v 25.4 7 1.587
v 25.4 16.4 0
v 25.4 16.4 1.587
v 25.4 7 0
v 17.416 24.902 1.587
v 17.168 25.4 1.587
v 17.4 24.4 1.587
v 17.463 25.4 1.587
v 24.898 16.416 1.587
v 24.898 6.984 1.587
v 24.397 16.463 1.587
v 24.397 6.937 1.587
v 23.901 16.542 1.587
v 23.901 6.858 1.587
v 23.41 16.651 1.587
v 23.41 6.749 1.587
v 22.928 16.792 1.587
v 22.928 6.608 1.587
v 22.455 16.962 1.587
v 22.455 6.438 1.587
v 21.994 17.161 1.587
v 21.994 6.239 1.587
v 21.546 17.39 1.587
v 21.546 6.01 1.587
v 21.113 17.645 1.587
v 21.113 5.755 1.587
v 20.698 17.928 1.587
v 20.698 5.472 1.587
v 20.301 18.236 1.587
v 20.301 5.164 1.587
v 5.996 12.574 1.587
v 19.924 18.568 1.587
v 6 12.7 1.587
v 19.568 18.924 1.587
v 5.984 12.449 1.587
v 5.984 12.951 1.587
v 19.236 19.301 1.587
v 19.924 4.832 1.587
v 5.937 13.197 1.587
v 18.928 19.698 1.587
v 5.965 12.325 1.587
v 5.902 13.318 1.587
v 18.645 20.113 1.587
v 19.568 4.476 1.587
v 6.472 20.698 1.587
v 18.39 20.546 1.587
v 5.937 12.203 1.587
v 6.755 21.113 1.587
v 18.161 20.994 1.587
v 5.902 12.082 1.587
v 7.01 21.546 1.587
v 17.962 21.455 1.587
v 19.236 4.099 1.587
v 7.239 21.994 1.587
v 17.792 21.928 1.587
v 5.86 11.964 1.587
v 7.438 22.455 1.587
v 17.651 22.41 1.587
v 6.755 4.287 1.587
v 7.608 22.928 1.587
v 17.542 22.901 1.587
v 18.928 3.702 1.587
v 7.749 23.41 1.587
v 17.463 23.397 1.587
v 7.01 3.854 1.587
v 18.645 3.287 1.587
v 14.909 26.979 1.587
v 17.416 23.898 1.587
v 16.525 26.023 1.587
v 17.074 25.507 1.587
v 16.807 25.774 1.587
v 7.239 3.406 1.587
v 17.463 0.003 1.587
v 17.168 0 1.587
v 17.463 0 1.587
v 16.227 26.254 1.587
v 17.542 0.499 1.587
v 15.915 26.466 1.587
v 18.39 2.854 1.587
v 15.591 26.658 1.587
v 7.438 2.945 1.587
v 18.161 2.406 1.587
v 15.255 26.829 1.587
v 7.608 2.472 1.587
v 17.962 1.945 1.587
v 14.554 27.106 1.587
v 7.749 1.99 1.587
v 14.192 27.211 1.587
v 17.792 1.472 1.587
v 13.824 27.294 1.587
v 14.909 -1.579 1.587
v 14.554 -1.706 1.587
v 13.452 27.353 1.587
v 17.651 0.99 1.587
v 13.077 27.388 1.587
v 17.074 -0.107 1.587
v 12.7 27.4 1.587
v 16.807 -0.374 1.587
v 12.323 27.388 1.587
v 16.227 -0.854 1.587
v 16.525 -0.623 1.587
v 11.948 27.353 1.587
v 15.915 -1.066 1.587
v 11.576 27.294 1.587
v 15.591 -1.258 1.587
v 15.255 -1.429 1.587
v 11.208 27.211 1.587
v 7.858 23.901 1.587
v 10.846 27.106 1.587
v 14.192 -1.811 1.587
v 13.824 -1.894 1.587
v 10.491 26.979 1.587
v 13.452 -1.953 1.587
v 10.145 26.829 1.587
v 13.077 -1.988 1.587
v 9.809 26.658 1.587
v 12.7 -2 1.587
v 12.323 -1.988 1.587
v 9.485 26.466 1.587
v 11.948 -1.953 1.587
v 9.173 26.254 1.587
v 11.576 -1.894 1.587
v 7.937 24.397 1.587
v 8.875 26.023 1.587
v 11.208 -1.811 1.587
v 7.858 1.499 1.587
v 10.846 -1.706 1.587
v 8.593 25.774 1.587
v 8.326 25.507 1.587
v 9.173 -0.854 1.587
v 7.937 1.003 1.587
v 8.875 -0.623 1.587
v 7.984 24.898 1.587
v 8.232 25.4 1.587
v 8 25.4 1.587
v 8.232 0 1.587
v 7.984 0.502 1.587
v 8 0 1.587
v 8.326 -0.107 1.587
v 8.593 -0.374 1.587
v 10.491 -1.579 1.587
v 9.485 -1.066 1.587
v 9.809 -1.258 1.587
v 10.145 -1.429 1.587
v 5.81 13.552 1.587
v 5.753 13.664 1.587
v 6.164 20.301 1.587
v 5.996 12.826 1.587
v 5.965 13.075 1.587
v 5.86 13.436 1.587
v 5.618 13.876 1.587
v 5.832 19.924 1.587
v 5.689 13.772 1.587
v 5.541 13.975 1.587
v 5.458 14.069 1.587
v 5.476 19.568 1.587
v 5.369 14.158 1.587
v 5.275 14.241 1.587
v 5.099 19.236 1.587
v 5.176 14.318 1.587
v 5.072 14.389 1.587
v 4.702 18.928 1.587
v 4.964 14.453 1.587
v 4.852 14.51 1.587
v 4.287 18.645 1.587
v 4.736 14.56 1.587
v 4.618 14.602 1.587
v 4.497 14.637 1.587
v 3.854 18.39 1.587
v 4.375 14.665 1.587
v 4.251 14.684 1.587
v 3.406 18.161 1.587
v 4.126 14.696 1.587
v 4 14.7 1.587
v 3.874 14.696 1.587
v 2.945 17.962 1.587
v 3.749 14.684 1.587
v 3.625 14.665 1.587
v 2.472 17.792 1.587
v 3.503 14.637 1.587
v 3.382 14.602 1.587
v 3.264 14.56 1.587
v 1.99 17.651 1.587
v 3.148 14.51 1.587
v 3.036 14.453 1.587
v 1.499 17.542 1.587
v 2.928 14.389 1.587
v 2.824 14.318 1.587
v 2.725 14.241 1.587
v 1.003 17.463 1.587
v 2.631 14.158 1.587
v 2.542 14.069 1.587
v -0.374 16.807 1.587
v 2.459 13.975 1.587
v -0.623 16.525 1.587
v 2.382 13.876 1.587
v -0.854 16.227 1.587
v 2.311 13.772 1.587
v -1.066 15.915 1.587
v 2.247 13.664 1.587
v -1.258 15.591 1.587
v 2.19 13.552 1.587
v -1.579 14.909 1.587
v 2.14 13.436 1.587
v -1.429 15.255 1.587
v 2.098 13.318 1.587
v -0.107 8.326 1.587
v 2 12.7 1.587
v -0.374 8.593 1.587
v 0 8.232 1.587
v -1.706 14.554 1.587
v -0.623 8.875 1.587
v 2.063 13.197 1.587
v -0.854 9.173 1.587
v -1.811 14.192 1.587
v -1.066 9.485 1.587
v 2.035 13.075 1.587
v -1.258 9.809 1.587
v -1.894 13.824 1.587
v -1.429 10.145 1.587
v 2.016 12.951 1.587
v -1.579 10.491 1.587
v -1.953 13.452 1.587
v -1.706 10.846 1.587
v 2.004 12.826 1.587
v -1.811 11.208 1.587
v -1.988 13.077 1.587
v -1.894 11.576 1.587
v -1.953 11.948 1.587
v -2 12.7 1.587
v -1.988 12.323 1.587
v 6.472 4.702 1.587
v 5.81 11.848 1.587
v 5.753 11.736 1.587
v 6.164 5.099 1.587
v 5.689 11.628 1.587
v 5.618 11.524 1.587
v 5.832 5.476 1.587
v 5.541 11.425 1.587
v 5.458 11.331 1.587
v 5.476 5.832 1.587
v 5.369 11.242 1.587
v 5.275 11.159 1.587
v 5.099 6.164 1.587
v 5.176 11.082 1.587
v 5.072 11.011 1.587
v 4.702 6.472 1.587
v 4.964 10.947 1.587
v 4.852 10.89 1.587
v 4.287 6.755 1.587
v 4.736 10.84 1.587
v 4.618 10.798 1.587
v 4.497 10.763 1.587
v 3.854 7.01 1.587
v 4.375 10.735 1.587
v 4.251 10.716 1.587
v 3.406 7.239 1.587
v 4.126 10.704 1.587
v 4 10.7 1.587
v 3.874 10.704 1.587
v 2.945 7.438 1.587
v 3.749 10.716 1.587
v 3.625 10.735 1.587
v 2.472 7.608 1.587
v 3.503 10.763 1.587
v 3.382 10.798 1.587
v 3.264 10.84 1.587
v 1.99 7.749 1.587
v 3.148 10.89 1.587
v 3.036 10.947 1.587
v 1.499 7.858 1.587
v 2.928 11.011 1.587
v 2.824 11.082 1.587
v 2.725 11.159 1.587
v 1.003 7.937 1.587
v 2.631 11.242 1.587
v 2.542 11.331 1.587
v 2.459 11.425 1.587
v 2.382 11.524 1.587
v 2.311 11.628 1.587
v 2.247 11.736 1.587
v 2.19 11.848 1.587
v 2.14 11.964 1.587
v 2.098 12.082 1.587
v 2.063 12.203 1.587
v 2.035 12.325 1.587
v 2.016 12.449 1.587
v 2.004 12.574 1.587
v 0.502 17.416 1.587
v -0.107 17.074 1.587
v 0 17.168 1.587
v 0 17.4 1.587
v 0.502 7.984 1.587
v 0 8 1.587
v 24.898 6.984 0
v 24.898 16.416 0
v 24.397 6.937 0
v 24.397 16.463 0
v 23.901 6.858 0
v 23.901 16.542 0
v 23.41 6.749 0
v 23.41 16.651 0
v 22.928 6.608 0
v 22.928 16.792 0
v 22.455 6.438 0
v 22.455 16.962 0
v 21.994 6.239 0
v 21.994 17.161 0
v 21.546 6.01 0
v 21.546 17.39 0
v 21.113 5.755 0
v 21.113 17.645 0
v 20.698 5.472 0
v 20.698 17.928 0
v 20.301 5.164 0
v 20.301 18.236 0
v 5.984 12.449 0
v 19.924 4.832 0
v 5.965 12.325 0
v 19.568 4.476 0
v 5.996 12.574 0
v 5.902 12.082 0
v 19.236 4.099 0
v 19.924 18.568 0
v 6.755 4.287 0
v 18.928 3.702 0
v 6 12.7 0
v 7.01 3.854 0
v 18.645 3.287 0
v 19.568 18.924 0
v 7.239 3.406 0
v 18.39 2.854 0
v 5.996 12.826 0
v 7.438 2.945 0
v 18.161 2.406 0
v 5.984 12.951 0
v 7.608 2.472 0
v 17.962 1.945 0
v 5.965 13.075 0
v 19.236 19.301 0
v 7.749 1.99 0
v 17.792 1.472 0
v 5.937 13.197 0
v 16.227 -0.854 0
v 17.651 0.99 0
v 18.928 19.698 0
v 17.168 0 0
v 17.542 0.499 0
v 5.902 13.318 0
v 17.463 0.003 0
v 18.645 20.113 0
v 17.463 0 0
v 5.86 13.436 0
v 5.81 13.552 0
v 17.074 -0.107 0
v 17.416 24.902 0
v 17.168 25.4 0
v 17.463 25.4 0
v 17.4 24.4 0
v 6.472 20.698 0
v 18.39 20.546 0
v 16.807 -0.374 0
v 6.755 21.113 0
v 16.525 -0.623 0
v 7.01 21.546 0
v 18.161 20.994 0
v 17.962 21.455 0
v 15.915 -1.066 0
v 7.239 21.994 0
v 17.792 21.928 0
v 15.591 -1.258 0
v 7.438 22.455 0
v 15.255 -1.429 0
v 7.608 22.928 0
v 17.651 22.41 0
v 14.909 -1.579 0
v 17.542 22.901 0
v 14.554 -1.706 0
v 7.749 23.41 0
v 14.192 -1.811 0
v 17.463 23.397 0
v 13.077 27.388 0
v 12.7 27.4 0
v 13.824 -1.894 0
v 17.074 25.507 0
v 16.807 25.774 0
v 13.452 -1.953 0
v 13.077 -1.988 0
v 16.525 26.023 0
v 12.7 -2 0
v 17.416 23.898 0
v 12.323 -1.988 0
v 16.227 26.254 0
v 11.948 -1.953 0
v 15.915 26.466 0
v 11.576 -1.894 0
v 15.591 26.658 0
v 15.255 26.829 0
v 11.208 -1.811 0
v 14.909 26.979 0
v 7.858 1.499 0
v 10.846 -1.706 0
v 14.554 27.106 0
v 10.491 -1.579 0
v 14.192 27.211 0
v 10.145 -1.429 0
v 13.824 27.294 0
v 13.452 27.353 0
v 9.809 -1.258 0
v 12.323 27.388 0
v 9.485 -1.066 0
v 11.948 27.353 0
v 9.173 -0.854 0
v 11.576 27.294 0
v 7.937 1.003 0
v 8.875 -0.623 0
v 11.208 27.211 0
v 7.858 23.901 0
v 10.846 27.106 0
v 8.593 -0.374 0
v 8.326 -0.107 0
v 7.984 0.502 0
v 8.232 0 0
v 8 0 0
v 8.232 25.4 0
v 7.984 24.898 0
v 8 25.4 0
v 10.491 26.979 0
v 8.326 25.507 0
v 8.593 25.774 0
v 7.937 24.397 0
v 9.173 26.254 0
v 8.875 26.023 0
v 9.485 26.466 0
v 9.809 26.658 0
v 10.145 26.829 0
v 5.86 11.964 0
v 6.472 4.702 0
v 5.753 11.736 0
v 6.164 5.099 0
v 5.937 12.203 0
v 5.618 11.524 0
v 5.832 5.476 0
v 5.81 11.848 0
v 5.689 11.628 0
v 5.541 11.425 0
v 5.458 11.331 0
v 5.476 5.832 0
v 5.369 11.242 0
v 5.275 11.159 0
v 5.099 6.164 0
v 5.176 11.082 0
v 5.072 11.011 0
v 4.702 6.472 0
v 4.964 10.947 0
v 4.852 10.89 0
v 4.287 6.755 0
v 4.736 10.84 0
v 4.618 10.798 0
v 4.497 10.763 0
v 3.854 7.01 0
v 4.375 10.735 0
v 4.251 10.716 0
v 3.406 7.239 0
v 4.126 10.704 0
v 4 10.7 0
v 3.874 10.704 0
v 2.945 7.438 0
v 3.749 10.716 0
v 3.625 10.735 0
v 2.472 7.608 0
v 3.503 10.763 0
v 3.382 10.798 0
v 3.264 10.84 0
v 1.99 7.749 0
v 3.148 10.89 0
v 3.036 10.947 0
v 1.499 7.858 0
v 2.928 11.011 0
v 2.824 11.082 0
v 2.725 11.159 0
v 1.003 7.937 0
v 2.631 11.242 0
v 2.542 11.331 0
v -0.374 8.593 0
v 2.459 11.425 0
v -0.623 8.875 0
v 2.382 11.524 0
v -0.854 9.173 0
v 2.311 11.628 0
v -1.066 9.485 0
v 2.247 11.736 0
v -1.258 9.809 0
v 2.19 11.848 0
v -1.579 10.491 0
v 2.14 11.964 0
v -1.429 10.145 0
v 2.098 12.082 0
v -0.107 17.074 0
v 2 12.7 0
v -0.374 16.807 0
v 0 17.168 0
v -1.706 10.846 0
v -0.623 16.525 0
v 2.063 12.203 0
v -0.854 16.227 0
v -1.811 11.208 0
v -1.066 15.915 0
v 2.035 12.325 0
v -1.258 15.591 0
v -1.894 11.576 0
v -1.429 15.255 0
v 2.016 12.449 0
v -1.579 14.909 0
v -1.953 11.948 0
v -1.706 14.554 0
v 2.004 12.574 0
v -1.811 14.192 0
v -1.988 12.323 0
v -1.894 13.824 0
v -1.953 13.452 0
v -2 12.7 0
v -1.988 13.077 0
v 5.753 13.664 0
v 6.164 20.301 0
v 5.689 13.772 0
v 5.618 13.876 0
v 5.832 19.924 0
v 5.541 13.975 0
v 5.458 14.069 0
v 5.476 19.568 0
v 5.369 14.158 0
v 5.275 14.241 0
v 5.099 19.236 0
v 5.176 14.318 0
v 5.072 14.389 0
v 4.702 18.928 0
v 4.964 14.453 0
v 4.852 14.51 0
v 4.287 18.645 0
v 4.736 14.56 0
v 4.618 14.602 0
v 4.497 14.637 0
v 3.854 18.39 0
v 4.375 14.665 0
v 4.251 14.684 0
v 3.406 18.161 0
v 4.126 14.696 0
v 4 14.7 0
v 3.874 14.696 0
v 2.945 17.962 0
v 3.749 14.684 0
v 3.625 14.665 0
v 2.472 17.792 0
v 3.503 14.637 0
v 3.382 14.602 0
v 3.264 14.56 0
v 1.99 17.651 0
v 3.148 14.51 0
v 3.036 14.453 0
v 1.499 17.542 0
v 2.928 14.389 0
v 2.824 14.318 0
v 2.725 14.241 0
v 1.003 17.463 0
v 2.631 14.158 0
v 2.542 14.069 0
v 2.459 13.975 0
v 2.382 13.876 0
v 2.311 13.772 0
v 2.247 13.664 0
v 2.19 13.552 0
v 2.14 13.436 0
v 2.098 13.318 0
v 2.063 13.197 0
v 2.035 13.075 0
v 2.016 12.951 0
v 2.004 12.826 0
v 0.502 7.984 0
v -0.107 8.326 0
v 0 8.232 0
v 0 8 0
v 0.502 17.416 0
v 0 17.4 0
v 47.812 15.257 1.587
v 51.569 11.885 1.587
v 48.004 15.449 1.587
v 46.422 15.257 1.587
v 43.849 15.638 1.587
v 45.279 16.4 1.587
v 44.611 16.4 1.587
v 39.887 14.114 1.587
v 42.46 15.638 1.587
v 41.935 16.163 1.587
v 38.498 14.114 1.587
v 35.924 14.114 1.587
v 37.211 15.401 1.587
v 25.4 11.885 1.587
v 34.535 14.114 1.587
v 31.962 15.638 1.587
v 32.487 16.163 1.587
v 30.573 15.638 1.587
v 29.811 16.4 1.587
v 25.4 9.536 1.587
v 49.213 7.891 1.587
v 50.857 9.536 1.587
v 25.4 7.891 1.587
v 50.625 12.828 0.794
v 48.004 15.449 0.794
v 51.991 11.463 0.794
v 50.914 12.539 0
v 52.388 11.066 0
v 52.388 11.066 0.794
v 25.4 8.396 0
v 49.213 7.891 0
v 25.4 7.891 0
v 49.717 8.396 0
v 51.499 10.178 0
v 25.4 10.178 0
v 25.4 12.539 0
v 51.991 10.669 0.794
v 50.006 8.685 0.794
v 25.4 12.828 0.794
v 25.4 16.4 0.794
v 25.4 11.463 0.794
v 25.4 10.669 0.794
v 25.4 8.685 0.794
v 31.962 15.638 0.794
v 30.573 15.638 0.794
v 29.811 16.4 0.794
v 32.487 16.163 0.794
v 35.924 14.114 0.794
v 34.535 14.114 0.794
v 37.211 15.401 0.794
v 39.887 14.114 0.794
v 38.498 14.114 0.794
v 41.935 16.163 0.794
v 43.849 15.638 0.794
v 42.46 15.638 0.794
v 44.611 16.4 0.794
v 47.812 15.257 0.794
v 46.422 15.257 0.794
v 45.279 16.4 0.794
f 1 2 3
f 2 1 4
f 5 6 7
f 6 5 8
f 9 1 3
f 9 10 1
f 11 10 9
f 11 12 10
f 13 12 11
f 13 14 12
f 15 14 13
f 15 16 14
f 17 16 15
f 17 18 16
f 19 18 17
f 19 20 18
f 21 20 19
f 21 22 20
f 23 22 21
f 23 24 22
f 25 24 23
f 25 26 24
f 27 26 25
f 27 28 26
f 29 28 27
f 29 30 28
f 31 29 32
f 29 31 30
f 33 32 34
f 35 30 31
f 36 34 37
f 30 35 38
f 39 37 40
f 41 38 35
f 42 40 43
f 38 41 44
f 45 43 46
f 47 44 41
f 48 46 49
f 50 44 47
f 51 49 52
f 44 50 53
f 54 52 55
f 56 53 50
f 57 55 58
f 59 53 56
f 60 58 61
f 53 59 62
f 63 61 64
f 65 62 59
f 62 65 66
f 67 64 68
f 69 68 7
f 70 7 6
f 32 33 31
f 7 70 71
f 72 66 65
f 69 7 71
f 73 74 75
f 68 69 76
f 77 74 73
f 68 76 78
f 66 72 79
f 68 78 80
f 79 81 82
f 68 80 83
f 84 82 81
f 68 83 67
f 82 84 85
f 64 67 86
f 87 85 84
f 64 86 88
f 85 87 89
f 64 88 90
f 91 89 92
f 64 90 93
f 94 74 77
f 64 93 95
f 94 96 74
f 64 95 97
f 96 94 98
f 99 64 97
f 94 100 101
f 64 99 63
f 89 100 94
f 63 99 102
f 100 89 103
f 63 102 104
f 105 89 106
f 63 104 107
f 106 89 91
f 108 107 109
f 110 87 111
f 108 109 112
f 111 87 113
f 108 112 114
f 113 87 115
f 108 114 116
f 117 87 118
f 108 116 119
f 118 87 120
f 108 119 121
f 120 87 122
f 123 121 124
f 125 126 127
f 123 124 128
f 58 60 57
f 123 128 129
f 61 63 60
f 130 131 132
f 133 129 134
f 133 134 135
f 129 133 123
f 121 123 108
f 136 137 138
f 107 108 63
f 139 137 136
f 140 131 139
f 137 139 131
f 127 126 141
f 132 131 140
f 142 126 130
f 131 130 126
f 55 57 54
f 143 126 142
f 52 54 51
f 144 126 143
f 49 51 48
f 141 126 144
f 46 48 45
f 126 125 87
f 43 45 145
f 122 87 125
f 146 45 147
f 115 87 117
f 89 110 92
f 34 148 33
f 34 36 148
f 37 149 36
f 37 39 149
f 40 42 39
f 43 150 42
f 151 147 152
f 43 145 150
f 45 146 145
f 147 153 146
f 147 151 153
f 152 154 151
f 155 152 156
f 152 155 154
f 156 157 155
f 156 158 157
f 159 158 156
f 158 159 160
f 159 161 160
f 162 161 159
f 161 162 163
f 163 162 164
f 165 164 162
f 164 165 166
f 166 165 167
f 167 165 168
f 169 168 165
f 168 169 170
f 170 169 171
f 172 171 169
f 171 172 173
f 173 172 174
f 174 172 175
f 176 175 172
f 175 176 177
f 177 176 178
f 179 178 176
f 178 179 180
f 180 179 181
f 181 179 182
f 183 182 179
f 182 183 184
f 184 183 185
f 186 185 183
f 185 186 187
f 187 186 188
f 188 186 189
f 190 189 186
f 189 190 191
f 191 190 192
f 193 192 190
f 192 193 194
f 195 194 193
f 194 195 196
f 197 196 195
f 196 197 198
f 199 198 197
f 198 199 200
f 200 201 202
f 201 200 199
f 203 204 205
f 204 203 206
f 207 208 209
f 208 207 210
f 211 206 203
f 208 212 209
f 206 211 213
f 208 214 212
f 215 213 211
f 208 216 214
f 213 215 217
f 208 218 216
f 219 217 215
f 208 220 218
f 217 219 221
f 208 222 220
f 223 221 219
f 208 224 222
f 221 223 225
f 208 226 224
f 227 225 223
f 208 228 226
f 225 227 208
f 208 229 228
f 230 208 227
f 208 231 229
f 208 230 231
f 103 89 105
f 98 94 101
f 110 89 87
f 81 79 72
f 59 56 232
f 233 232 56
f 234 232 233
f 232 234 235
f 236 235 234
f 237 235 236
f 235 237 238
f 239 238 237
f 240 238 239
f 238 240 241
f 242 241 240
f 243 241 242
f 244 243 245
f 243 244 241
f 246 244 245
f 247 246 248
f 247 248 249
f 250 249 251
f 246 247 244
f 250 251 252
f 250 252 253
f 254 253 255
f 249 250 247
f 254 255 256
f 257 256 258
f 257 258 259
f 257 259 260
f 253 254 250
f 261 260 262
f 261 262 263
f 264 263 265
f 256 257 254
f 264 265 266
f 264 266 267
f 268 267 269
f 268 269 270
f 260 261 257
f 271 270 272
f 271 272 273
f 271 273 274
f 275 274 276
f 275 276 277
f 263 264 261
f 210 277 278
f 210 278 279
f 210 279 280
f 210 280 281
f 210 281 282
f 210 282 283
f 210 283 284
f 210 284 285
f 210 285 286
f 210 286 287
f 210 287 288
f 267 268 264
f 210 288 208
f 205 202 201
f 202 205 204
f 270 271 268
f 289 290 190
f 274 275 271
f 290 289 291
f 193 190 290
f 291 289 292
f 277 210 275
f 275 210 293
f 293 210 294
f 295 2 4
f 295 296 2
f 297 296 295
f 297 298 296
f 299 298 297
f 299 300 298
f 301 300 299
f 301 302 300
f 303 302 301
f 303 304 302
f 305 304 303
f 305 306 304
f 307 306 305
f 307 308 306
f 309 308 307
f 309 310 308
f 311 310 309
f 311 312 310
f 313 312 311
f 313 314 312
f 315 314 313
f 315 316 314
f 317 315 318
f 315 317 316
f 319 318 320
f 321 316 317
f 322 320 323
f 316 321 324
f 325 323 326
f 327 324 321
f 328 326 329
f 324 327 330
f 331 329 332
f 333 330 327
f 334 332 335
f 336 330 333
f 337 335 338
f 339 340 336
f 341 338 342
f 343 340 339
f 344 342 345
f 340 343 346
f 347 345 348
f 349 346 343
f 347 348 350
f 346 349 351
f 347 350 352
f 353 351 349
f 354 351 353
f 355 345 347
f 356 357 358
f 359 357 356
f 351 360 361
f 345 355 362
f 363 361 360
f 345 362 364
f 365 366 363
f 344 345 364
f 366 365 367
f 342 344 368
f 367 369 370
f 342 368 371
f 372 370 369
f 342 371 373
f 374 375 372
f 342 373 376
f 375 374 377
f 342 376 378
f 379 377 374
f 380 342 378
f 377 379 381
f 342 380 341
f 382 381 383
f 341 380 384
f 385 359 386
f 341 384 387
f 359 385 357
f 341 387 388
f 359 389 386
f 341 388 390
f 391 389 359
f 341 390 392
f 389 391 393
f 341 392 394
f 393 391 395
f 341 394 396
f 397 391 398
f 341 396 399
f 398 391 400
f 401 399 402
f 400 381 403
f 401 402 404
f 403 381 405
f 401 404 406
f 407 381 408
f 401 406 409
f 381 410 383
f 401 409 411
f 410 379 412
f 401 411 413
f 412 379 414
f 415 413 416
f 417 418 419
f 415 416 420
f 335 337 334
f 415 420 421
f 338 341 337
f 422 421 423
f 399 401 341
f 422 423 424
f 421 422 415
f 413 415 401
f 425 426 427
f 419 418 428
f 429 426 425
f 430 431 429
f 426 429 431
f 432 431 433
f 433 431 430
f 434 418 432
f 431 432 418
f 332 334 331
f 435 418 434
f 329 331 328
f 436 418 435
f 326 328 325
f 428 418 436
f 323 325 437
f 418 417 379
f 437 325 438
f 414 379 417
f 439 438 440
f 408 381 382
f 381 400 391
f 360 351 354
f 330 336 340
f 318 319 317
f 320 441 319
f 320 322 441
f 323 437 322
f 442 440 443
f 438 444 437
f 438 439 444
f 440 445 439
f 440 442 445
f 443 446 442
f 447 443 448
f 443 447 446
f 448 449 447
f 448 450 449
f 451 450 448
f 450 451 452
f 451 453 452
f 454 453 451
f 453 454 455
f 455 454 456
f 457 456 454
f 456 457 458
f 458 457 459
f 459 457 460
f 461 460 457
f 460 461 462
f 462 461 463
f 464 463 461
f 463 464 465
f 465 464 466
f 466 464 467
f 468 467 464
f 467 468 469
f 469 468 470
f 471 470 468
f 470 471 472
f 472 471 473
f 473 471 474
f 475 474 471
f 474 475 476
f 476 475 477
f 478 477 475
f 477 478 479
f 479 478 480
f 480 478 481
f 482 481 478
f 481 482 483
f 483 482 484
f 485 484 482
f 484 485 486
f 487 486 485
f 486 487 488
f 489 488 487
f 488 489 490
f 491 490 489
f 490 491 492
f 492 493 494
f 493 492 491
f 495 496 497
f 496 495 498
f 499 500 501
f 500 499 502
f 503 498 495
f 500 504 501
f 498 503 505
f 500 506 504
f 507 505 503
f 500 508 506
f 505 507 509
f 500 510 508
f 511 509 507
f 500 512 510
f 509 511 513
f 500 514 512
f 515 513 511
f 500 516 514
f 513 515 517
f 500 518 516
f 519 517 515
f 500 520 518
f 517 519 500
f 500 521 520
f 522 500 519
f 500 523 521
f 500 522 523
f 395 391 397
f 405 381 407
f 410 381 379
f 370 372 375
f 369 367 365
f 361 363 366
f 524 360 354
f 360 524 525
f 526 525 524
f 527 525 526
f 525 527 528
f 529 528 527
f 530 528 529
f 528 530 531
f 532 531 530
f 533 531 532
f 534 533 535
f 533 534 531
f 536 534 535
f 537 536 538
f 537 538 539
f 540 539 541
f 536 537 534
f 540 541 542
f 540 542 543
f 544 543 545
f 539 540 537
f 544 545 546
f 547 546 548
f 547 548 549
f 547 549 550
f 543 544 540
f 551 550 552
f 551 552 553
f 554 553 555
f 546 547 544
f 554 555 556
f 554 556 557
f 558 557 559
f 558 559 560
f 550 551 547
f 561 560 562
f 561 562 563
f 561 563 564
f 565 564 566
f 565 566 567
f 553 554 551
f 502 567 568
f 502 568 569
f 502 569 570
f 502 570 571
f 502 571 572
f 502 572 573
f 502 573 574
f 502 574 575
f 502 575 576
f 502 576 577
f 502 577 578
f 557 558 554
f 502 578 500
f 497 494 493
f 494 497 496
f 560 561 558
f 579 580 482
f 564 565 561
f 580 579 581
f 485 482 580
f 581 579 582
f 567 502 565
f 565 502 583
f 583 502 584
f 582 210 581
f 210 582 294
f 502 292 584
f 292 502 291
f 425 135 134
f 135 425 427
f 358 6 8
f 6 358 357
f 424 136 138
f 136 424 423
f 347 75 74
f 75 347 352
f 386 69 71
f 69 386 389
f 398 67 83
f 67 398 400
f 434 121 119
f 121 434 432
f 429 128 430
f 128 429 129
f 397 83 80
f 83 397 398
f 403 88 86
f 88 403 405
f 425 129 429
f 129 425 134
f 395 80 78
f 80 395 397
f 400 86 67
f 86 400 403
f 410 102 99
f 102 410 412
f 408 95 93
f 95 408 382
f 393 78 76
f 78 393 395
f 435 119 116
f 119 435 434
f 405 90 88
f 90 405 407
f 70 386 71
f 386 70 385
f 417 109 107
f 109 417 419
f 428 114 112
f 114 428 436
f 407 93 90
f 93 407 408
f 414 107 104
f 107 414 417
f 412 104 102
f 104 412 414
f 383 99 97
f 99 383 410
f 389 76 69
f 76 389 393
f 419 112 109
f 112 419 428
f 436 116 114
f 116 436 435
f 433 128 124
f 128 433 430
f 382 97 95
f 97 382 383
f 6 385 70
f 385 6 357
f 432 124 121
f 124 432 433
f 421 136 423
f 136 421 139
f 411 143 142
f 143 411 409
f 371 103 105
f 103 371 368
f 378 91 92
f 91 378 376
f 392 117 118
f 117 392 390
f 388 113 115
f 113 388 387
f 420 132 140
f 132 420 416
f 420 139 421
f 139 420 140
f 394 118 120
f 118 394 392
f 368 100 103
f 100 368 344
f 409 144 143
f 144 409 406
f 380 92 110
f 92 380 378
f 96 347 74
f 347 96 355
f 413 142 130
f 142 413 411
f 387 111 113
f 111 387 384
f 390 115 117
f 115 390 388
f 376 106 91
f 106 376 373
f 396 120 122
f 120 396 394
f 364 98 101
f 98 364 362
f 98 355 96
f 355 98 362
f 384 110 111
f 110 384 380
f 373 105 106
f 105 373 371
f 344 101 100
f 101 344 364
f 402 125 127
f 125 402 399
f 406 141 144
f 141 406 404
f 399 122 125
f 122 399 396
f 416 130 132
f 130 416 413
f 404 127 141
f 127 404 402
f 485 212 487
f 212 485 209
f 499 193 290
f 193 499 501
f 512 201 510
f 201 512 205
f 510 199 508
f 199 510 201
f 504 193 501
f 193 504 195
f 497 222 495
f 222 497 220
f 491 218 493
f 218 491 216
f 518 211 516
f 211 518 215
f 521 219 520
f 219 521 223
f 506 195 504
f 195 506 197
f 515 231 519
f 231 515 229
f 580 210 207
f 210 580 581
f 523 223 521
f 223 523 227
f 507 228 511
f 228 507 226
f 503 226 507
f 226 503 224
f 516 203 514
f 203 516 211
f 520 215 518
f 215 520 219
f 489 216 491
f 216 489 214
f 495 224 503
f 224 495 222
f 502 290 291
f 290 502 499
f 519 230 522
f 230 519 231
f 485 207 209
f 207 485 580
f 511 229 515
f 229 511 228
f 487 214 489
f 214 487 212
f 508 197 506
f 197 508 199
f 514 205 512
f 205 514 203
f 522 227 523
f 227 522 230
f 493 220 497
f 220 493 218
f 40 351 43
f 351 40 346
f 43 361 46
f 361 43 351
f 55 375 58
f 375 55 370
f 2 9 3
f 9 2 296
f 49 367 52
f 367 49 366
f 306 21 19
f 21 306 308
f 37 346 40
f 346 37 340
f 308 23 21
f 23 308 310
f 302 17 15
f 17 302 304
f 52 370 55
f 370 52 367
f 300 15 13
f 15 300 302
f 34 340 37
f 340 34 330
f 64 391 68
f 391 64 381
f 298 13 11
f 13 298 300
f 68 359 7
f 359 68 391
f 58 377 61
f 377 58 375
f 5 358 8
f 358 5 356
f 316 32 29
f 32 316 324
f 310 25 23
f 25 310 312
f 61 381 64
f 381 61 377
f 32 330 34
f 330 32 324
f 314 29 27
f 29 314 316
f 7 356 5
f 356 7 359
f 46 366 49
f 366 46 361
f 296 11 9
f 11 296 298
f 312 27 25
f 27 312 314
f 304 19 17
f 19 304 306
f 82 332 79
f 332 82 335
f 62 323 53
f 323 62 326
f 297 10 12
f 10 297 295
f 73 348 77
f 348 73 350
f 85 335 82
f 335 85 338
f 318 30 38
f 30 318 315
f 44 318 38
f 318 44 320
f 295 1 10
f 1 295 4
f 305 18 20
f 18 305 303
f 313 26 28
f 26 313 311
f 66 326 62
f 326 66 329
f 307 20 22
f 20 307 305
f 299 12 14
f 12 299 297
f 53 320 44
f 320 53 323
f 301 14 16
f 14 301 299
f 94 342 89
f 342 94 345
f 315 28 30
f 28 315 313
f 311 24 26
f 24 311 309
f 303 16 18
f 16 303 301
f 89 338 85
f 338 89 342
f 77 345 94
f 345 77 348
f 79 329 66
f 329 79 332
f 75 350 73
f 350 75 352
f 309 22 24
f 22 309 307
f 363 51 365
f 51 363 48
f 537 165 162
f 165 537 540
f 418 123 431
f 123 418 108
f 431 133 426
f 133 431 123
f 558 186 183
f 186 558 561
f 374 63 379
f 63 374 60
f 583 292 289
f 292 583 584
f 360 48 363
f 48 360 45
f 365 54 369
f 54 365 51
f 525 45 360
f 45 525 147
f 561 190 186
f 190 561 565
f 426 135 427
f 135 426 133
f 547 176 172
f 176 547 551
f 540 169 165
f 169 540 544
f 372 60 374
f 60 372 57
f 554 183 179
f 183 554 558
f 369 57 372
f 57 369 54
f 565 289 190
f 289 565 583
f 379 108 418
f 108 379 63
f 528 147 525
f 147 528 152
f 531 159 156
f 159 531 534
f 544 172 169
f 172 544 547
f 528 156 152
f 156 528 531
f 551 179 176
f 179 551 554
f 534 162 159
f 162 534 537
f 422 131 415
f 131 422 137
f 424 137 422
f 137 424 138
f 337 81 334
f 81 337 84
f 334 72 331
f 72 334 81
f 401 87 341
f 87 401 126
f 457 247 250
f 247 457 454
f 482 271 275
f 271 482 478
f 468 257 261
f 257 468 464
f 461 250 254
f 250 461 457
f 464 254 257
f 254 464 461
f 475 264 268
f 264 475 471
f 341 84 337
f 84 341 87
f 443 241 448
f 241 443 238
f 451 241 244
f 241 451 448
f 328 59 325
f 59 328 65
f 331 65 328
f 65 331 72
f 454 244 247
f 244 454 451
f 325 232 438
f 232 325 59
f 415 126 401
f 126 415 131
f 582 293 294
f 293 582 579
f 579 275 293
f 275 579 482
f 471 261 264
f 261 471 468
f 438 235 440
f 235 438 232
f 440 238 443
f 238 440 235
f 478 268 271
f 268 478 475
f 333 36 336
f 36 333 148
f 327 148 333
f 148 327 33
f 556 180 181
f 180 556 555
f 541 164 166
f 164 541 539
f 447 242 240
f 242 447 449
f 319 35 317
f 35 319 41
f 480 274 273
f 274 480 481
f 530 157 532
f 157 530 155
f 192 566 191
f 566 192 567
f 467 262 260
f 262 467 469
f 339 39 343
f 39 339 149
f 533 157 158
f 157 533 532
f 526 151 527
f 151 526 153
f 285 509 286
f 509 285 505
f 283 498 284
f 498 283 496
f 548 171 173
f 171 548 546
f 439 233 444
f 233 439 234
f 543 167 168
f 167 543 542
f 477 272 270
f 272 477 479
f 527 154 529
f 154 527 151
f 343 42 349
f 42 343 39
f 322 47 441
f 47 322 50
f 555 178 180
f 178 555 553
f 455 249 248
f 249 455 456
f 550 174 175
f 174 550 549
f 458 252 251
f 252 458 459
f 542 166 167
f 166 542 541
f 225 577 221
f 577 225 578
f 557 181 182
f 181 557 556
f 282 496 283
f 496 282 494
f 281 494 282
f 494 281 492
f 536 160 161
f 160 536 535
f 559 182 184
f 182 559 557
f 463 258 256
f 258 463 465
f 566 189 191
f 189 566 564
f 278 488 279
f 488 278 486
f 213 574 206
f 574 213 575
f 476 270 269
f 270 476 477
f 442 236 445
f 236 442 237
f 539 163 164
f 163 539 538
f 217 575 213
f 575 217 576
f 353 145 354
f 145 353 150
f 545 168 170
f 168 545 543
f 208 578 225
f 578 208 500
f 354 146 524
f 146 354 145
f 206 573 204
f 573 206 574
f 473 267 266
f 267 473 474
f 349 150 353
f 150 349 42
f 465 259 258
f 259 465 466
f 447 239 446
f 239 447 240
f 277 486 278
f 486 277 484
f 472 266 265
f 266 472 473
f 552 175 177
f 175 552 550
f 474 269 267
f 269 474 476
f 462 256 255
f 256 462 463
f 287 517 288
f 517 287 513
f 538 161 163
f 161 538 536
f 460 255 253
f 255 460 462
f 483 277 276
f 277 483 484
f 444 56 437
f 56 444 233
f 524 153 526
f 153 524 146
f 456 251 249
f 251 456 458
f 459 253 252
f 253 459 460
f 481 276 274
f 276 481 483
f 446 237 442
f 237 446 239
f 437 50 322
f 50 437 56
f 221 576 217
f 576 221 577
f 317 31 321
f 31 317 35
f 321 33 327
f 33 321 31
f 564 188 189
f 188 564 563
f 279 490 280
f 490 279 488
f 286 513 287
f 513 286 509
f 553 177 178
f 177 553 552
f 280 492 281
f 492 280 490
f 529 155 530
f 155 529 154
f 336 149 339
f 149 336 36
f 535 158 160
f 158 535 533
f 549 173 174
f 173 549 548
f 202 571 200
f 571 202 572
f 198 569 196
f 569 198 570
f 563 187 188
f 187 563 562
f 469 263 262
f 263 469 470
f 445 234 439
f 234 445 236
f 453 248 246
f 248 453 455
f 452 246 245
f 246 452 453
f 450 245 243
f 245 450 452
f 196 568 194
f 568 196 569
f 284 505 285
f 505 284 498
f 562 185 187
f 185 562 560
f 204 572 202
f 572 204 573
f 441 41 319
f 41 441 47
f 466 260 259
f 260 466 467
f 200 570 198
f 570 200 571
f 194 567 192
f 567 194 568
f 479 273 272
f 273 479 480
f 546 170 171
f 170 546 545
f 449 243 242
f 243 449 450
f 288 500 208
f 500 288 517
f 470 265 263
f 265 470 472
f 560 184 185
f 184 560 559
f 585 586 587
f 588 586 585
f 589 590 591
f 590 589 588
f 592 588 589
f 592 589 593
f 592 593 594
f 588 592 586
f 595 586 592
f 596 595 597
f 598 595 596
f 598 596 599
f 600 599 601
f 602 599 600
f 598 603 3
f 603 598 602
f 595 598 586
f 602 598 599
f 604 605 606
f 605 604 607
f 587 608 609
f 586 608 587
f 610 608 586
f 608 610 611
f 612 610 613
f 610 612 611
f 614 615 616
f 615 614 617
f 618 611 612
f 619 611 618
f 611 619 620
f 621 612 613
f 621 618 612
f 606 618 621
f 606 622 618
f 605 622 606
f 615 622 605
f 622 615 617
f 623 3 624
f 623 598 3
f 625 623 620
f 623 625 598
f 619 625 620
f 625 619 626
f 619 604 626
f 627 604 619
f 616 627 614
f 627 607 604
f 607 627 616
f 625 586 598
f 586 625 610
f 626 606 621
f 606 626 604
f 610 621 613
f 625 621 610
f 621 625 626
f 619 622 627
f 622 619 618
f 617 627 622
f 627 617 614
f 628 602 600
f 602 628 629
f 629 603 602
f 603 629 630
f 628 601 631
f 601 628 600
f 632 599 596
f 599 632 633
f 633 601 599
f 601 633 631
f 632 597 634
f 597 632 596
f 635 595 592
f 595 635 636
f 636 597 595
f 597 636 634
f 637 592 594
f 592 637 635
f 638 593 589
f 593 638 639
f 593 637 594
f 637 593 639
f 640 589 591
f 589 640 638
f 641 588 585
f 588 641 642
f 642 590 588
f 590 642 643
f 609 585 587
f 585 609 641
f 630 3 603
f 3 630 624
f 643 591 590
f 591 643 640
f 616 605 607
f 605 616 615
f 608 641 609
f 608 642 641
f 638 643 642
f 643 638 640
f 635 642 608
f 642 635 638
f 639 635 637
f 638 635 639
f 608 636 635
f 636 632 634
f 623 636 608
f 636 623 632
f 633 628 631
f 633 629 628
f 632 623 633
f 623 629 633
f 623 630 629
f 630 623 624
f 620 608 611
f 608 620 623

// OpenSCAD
//BEST G - Model

$fn=100;

function mm(i) = i*25.4;

module bow(bow_length, bow_width, bow_thickness)
{
	difference()
	{
		union()
		{
			cube([bow_length, bow_width, bow_thickness]);

			//Place cylinders on the top and bottom of the bow for style

			//Top middle
			translate([bow_length / 2, bow_width - 4, 0]) cylinder(h = bow_thickness, r = 6);

			//Bottom middle
			translate([bow_length / 2, 4, 0]) cylinder(h = bow_thickness, r = 6);

			//Left
			translate([4, bow_width / 2, 0]) cylinder(h = bow_thickness, r = 6);
		}

		//Place cylinders around the edges to create a more contoured design

		//Right top
		translate([bow_length, bow_width - 1, 0]) cylinder(h = bow_thickness, r = 8);

		//Right bottom
		//Positioned -1 from the axis to create a bow stop
		translate([bow_length, -1 , 0]) cylinder(h = bow_thickness, r = 8);
		
		//Left top
		translate([0, bow_width, 0]) cylinder(h = bow_thickness, r = 8);
	
		//Left bottom
		translate([0, 0, 0]) cylinder(h = bow_thickness, r = 8);

		//Place hole for keychain use
		translate([4, bow_width / 2, 0]) cylinder(h = bow_thickness, r = 2);
	}
}

module bit()
{
	w = mm(1/4);
	difference() 
	{
		translate([-w/2, 0, 0]) cube([w, mm(1), w]);
		translate([-mm(7/256), 0, 0]) rotate([0, 0, 135]) cube([w, w, w]);
		translate([mm(7/256), 0, 0]) rotate([0, 0, -45]) cube([w, w, w]);
	}
}

module blade(blade_length, blade_width, blade_thickness, key_cuts, shoulder, cut_spacing, cut_depth)
{
	difference()
	{
		cube([blade_length, blade_width, blade_thickness]);

		//Contour tip		
		translate([blade_length, mm(1/8), 0]) 
		{
			rotate([0, 0, 45]) cube([10, 10, blade_thickness]);
			rotate([0, 0, 225]) cube([10, 10, blade_thickness]);
		}
		
		//Cut the key channels
		union()
		{
			translate([0, mm(9/64), blade_thickness / 2]) rotate([62, 0, 0]) cube([blade_length, blade_width, blade_width]);
			translate([0, mm(7/64), blade_thickness / 2]) rotate([55, 0, 0]) cube([blade_length, blade_width, blade_width]);
			translate([0, mm(7/64), blade_thickness / 2]) cube([blade_length, mm(1/32), blade_width]);
		}
        
		translate([0, blade_width - mm(9/64), 0]) cube([blade_length, mm(10/64), blade_thickness / 2]);
		translate([0, blade_width - mm(9/64), blade_thickness / 2]) rotate([-110, 0, 0]) cube([blade_length, blade_width, blade_thickness / 2]);
        
		intersection() 
		{
			translate([0, mm(1/32), blade_thickness / 2]) rotate([-118, 0, 0]) cube([blade_length, blade_width, blade_width]);
			translate([0, mm(1/32), blade_thickness / 2]) rotate([-110, 0, 0]) cube([blade_length, blade_width, blade_width]);
		}

		//Cut the blade
		for (counter = [0:4]) 
		{
			translate([shoulder + (counter * cut_spacing), blade_width - (key_cuts[counter]) * cut_depth, 0]) bit();
		}
	}
}

module sc1(key_cuts) 
{
	blade_length = mm(17/16);
	blade_width = mm(.335);
	blade_thickness = mm(0.080);

	shoulder = mm(0.231);
	cut_spacing = mm(.156);
	cut_depth = mm(.015);
    
	bow_length = mm(1);
	bow_width = mm(1);
	bow_thickness = mm(1/16);

	union()
	{
		bow(bow_length, bow_width, bow_thickness); 
		translate([bow_length, bow_width - blade_width - 9, 0]) blade(blade_length, blade_width, bow_thickness, key_cuts, shoulder, cut_spacing, cut_depth);
	}
}

sc1([2, 6, 6, 2, 3]);
